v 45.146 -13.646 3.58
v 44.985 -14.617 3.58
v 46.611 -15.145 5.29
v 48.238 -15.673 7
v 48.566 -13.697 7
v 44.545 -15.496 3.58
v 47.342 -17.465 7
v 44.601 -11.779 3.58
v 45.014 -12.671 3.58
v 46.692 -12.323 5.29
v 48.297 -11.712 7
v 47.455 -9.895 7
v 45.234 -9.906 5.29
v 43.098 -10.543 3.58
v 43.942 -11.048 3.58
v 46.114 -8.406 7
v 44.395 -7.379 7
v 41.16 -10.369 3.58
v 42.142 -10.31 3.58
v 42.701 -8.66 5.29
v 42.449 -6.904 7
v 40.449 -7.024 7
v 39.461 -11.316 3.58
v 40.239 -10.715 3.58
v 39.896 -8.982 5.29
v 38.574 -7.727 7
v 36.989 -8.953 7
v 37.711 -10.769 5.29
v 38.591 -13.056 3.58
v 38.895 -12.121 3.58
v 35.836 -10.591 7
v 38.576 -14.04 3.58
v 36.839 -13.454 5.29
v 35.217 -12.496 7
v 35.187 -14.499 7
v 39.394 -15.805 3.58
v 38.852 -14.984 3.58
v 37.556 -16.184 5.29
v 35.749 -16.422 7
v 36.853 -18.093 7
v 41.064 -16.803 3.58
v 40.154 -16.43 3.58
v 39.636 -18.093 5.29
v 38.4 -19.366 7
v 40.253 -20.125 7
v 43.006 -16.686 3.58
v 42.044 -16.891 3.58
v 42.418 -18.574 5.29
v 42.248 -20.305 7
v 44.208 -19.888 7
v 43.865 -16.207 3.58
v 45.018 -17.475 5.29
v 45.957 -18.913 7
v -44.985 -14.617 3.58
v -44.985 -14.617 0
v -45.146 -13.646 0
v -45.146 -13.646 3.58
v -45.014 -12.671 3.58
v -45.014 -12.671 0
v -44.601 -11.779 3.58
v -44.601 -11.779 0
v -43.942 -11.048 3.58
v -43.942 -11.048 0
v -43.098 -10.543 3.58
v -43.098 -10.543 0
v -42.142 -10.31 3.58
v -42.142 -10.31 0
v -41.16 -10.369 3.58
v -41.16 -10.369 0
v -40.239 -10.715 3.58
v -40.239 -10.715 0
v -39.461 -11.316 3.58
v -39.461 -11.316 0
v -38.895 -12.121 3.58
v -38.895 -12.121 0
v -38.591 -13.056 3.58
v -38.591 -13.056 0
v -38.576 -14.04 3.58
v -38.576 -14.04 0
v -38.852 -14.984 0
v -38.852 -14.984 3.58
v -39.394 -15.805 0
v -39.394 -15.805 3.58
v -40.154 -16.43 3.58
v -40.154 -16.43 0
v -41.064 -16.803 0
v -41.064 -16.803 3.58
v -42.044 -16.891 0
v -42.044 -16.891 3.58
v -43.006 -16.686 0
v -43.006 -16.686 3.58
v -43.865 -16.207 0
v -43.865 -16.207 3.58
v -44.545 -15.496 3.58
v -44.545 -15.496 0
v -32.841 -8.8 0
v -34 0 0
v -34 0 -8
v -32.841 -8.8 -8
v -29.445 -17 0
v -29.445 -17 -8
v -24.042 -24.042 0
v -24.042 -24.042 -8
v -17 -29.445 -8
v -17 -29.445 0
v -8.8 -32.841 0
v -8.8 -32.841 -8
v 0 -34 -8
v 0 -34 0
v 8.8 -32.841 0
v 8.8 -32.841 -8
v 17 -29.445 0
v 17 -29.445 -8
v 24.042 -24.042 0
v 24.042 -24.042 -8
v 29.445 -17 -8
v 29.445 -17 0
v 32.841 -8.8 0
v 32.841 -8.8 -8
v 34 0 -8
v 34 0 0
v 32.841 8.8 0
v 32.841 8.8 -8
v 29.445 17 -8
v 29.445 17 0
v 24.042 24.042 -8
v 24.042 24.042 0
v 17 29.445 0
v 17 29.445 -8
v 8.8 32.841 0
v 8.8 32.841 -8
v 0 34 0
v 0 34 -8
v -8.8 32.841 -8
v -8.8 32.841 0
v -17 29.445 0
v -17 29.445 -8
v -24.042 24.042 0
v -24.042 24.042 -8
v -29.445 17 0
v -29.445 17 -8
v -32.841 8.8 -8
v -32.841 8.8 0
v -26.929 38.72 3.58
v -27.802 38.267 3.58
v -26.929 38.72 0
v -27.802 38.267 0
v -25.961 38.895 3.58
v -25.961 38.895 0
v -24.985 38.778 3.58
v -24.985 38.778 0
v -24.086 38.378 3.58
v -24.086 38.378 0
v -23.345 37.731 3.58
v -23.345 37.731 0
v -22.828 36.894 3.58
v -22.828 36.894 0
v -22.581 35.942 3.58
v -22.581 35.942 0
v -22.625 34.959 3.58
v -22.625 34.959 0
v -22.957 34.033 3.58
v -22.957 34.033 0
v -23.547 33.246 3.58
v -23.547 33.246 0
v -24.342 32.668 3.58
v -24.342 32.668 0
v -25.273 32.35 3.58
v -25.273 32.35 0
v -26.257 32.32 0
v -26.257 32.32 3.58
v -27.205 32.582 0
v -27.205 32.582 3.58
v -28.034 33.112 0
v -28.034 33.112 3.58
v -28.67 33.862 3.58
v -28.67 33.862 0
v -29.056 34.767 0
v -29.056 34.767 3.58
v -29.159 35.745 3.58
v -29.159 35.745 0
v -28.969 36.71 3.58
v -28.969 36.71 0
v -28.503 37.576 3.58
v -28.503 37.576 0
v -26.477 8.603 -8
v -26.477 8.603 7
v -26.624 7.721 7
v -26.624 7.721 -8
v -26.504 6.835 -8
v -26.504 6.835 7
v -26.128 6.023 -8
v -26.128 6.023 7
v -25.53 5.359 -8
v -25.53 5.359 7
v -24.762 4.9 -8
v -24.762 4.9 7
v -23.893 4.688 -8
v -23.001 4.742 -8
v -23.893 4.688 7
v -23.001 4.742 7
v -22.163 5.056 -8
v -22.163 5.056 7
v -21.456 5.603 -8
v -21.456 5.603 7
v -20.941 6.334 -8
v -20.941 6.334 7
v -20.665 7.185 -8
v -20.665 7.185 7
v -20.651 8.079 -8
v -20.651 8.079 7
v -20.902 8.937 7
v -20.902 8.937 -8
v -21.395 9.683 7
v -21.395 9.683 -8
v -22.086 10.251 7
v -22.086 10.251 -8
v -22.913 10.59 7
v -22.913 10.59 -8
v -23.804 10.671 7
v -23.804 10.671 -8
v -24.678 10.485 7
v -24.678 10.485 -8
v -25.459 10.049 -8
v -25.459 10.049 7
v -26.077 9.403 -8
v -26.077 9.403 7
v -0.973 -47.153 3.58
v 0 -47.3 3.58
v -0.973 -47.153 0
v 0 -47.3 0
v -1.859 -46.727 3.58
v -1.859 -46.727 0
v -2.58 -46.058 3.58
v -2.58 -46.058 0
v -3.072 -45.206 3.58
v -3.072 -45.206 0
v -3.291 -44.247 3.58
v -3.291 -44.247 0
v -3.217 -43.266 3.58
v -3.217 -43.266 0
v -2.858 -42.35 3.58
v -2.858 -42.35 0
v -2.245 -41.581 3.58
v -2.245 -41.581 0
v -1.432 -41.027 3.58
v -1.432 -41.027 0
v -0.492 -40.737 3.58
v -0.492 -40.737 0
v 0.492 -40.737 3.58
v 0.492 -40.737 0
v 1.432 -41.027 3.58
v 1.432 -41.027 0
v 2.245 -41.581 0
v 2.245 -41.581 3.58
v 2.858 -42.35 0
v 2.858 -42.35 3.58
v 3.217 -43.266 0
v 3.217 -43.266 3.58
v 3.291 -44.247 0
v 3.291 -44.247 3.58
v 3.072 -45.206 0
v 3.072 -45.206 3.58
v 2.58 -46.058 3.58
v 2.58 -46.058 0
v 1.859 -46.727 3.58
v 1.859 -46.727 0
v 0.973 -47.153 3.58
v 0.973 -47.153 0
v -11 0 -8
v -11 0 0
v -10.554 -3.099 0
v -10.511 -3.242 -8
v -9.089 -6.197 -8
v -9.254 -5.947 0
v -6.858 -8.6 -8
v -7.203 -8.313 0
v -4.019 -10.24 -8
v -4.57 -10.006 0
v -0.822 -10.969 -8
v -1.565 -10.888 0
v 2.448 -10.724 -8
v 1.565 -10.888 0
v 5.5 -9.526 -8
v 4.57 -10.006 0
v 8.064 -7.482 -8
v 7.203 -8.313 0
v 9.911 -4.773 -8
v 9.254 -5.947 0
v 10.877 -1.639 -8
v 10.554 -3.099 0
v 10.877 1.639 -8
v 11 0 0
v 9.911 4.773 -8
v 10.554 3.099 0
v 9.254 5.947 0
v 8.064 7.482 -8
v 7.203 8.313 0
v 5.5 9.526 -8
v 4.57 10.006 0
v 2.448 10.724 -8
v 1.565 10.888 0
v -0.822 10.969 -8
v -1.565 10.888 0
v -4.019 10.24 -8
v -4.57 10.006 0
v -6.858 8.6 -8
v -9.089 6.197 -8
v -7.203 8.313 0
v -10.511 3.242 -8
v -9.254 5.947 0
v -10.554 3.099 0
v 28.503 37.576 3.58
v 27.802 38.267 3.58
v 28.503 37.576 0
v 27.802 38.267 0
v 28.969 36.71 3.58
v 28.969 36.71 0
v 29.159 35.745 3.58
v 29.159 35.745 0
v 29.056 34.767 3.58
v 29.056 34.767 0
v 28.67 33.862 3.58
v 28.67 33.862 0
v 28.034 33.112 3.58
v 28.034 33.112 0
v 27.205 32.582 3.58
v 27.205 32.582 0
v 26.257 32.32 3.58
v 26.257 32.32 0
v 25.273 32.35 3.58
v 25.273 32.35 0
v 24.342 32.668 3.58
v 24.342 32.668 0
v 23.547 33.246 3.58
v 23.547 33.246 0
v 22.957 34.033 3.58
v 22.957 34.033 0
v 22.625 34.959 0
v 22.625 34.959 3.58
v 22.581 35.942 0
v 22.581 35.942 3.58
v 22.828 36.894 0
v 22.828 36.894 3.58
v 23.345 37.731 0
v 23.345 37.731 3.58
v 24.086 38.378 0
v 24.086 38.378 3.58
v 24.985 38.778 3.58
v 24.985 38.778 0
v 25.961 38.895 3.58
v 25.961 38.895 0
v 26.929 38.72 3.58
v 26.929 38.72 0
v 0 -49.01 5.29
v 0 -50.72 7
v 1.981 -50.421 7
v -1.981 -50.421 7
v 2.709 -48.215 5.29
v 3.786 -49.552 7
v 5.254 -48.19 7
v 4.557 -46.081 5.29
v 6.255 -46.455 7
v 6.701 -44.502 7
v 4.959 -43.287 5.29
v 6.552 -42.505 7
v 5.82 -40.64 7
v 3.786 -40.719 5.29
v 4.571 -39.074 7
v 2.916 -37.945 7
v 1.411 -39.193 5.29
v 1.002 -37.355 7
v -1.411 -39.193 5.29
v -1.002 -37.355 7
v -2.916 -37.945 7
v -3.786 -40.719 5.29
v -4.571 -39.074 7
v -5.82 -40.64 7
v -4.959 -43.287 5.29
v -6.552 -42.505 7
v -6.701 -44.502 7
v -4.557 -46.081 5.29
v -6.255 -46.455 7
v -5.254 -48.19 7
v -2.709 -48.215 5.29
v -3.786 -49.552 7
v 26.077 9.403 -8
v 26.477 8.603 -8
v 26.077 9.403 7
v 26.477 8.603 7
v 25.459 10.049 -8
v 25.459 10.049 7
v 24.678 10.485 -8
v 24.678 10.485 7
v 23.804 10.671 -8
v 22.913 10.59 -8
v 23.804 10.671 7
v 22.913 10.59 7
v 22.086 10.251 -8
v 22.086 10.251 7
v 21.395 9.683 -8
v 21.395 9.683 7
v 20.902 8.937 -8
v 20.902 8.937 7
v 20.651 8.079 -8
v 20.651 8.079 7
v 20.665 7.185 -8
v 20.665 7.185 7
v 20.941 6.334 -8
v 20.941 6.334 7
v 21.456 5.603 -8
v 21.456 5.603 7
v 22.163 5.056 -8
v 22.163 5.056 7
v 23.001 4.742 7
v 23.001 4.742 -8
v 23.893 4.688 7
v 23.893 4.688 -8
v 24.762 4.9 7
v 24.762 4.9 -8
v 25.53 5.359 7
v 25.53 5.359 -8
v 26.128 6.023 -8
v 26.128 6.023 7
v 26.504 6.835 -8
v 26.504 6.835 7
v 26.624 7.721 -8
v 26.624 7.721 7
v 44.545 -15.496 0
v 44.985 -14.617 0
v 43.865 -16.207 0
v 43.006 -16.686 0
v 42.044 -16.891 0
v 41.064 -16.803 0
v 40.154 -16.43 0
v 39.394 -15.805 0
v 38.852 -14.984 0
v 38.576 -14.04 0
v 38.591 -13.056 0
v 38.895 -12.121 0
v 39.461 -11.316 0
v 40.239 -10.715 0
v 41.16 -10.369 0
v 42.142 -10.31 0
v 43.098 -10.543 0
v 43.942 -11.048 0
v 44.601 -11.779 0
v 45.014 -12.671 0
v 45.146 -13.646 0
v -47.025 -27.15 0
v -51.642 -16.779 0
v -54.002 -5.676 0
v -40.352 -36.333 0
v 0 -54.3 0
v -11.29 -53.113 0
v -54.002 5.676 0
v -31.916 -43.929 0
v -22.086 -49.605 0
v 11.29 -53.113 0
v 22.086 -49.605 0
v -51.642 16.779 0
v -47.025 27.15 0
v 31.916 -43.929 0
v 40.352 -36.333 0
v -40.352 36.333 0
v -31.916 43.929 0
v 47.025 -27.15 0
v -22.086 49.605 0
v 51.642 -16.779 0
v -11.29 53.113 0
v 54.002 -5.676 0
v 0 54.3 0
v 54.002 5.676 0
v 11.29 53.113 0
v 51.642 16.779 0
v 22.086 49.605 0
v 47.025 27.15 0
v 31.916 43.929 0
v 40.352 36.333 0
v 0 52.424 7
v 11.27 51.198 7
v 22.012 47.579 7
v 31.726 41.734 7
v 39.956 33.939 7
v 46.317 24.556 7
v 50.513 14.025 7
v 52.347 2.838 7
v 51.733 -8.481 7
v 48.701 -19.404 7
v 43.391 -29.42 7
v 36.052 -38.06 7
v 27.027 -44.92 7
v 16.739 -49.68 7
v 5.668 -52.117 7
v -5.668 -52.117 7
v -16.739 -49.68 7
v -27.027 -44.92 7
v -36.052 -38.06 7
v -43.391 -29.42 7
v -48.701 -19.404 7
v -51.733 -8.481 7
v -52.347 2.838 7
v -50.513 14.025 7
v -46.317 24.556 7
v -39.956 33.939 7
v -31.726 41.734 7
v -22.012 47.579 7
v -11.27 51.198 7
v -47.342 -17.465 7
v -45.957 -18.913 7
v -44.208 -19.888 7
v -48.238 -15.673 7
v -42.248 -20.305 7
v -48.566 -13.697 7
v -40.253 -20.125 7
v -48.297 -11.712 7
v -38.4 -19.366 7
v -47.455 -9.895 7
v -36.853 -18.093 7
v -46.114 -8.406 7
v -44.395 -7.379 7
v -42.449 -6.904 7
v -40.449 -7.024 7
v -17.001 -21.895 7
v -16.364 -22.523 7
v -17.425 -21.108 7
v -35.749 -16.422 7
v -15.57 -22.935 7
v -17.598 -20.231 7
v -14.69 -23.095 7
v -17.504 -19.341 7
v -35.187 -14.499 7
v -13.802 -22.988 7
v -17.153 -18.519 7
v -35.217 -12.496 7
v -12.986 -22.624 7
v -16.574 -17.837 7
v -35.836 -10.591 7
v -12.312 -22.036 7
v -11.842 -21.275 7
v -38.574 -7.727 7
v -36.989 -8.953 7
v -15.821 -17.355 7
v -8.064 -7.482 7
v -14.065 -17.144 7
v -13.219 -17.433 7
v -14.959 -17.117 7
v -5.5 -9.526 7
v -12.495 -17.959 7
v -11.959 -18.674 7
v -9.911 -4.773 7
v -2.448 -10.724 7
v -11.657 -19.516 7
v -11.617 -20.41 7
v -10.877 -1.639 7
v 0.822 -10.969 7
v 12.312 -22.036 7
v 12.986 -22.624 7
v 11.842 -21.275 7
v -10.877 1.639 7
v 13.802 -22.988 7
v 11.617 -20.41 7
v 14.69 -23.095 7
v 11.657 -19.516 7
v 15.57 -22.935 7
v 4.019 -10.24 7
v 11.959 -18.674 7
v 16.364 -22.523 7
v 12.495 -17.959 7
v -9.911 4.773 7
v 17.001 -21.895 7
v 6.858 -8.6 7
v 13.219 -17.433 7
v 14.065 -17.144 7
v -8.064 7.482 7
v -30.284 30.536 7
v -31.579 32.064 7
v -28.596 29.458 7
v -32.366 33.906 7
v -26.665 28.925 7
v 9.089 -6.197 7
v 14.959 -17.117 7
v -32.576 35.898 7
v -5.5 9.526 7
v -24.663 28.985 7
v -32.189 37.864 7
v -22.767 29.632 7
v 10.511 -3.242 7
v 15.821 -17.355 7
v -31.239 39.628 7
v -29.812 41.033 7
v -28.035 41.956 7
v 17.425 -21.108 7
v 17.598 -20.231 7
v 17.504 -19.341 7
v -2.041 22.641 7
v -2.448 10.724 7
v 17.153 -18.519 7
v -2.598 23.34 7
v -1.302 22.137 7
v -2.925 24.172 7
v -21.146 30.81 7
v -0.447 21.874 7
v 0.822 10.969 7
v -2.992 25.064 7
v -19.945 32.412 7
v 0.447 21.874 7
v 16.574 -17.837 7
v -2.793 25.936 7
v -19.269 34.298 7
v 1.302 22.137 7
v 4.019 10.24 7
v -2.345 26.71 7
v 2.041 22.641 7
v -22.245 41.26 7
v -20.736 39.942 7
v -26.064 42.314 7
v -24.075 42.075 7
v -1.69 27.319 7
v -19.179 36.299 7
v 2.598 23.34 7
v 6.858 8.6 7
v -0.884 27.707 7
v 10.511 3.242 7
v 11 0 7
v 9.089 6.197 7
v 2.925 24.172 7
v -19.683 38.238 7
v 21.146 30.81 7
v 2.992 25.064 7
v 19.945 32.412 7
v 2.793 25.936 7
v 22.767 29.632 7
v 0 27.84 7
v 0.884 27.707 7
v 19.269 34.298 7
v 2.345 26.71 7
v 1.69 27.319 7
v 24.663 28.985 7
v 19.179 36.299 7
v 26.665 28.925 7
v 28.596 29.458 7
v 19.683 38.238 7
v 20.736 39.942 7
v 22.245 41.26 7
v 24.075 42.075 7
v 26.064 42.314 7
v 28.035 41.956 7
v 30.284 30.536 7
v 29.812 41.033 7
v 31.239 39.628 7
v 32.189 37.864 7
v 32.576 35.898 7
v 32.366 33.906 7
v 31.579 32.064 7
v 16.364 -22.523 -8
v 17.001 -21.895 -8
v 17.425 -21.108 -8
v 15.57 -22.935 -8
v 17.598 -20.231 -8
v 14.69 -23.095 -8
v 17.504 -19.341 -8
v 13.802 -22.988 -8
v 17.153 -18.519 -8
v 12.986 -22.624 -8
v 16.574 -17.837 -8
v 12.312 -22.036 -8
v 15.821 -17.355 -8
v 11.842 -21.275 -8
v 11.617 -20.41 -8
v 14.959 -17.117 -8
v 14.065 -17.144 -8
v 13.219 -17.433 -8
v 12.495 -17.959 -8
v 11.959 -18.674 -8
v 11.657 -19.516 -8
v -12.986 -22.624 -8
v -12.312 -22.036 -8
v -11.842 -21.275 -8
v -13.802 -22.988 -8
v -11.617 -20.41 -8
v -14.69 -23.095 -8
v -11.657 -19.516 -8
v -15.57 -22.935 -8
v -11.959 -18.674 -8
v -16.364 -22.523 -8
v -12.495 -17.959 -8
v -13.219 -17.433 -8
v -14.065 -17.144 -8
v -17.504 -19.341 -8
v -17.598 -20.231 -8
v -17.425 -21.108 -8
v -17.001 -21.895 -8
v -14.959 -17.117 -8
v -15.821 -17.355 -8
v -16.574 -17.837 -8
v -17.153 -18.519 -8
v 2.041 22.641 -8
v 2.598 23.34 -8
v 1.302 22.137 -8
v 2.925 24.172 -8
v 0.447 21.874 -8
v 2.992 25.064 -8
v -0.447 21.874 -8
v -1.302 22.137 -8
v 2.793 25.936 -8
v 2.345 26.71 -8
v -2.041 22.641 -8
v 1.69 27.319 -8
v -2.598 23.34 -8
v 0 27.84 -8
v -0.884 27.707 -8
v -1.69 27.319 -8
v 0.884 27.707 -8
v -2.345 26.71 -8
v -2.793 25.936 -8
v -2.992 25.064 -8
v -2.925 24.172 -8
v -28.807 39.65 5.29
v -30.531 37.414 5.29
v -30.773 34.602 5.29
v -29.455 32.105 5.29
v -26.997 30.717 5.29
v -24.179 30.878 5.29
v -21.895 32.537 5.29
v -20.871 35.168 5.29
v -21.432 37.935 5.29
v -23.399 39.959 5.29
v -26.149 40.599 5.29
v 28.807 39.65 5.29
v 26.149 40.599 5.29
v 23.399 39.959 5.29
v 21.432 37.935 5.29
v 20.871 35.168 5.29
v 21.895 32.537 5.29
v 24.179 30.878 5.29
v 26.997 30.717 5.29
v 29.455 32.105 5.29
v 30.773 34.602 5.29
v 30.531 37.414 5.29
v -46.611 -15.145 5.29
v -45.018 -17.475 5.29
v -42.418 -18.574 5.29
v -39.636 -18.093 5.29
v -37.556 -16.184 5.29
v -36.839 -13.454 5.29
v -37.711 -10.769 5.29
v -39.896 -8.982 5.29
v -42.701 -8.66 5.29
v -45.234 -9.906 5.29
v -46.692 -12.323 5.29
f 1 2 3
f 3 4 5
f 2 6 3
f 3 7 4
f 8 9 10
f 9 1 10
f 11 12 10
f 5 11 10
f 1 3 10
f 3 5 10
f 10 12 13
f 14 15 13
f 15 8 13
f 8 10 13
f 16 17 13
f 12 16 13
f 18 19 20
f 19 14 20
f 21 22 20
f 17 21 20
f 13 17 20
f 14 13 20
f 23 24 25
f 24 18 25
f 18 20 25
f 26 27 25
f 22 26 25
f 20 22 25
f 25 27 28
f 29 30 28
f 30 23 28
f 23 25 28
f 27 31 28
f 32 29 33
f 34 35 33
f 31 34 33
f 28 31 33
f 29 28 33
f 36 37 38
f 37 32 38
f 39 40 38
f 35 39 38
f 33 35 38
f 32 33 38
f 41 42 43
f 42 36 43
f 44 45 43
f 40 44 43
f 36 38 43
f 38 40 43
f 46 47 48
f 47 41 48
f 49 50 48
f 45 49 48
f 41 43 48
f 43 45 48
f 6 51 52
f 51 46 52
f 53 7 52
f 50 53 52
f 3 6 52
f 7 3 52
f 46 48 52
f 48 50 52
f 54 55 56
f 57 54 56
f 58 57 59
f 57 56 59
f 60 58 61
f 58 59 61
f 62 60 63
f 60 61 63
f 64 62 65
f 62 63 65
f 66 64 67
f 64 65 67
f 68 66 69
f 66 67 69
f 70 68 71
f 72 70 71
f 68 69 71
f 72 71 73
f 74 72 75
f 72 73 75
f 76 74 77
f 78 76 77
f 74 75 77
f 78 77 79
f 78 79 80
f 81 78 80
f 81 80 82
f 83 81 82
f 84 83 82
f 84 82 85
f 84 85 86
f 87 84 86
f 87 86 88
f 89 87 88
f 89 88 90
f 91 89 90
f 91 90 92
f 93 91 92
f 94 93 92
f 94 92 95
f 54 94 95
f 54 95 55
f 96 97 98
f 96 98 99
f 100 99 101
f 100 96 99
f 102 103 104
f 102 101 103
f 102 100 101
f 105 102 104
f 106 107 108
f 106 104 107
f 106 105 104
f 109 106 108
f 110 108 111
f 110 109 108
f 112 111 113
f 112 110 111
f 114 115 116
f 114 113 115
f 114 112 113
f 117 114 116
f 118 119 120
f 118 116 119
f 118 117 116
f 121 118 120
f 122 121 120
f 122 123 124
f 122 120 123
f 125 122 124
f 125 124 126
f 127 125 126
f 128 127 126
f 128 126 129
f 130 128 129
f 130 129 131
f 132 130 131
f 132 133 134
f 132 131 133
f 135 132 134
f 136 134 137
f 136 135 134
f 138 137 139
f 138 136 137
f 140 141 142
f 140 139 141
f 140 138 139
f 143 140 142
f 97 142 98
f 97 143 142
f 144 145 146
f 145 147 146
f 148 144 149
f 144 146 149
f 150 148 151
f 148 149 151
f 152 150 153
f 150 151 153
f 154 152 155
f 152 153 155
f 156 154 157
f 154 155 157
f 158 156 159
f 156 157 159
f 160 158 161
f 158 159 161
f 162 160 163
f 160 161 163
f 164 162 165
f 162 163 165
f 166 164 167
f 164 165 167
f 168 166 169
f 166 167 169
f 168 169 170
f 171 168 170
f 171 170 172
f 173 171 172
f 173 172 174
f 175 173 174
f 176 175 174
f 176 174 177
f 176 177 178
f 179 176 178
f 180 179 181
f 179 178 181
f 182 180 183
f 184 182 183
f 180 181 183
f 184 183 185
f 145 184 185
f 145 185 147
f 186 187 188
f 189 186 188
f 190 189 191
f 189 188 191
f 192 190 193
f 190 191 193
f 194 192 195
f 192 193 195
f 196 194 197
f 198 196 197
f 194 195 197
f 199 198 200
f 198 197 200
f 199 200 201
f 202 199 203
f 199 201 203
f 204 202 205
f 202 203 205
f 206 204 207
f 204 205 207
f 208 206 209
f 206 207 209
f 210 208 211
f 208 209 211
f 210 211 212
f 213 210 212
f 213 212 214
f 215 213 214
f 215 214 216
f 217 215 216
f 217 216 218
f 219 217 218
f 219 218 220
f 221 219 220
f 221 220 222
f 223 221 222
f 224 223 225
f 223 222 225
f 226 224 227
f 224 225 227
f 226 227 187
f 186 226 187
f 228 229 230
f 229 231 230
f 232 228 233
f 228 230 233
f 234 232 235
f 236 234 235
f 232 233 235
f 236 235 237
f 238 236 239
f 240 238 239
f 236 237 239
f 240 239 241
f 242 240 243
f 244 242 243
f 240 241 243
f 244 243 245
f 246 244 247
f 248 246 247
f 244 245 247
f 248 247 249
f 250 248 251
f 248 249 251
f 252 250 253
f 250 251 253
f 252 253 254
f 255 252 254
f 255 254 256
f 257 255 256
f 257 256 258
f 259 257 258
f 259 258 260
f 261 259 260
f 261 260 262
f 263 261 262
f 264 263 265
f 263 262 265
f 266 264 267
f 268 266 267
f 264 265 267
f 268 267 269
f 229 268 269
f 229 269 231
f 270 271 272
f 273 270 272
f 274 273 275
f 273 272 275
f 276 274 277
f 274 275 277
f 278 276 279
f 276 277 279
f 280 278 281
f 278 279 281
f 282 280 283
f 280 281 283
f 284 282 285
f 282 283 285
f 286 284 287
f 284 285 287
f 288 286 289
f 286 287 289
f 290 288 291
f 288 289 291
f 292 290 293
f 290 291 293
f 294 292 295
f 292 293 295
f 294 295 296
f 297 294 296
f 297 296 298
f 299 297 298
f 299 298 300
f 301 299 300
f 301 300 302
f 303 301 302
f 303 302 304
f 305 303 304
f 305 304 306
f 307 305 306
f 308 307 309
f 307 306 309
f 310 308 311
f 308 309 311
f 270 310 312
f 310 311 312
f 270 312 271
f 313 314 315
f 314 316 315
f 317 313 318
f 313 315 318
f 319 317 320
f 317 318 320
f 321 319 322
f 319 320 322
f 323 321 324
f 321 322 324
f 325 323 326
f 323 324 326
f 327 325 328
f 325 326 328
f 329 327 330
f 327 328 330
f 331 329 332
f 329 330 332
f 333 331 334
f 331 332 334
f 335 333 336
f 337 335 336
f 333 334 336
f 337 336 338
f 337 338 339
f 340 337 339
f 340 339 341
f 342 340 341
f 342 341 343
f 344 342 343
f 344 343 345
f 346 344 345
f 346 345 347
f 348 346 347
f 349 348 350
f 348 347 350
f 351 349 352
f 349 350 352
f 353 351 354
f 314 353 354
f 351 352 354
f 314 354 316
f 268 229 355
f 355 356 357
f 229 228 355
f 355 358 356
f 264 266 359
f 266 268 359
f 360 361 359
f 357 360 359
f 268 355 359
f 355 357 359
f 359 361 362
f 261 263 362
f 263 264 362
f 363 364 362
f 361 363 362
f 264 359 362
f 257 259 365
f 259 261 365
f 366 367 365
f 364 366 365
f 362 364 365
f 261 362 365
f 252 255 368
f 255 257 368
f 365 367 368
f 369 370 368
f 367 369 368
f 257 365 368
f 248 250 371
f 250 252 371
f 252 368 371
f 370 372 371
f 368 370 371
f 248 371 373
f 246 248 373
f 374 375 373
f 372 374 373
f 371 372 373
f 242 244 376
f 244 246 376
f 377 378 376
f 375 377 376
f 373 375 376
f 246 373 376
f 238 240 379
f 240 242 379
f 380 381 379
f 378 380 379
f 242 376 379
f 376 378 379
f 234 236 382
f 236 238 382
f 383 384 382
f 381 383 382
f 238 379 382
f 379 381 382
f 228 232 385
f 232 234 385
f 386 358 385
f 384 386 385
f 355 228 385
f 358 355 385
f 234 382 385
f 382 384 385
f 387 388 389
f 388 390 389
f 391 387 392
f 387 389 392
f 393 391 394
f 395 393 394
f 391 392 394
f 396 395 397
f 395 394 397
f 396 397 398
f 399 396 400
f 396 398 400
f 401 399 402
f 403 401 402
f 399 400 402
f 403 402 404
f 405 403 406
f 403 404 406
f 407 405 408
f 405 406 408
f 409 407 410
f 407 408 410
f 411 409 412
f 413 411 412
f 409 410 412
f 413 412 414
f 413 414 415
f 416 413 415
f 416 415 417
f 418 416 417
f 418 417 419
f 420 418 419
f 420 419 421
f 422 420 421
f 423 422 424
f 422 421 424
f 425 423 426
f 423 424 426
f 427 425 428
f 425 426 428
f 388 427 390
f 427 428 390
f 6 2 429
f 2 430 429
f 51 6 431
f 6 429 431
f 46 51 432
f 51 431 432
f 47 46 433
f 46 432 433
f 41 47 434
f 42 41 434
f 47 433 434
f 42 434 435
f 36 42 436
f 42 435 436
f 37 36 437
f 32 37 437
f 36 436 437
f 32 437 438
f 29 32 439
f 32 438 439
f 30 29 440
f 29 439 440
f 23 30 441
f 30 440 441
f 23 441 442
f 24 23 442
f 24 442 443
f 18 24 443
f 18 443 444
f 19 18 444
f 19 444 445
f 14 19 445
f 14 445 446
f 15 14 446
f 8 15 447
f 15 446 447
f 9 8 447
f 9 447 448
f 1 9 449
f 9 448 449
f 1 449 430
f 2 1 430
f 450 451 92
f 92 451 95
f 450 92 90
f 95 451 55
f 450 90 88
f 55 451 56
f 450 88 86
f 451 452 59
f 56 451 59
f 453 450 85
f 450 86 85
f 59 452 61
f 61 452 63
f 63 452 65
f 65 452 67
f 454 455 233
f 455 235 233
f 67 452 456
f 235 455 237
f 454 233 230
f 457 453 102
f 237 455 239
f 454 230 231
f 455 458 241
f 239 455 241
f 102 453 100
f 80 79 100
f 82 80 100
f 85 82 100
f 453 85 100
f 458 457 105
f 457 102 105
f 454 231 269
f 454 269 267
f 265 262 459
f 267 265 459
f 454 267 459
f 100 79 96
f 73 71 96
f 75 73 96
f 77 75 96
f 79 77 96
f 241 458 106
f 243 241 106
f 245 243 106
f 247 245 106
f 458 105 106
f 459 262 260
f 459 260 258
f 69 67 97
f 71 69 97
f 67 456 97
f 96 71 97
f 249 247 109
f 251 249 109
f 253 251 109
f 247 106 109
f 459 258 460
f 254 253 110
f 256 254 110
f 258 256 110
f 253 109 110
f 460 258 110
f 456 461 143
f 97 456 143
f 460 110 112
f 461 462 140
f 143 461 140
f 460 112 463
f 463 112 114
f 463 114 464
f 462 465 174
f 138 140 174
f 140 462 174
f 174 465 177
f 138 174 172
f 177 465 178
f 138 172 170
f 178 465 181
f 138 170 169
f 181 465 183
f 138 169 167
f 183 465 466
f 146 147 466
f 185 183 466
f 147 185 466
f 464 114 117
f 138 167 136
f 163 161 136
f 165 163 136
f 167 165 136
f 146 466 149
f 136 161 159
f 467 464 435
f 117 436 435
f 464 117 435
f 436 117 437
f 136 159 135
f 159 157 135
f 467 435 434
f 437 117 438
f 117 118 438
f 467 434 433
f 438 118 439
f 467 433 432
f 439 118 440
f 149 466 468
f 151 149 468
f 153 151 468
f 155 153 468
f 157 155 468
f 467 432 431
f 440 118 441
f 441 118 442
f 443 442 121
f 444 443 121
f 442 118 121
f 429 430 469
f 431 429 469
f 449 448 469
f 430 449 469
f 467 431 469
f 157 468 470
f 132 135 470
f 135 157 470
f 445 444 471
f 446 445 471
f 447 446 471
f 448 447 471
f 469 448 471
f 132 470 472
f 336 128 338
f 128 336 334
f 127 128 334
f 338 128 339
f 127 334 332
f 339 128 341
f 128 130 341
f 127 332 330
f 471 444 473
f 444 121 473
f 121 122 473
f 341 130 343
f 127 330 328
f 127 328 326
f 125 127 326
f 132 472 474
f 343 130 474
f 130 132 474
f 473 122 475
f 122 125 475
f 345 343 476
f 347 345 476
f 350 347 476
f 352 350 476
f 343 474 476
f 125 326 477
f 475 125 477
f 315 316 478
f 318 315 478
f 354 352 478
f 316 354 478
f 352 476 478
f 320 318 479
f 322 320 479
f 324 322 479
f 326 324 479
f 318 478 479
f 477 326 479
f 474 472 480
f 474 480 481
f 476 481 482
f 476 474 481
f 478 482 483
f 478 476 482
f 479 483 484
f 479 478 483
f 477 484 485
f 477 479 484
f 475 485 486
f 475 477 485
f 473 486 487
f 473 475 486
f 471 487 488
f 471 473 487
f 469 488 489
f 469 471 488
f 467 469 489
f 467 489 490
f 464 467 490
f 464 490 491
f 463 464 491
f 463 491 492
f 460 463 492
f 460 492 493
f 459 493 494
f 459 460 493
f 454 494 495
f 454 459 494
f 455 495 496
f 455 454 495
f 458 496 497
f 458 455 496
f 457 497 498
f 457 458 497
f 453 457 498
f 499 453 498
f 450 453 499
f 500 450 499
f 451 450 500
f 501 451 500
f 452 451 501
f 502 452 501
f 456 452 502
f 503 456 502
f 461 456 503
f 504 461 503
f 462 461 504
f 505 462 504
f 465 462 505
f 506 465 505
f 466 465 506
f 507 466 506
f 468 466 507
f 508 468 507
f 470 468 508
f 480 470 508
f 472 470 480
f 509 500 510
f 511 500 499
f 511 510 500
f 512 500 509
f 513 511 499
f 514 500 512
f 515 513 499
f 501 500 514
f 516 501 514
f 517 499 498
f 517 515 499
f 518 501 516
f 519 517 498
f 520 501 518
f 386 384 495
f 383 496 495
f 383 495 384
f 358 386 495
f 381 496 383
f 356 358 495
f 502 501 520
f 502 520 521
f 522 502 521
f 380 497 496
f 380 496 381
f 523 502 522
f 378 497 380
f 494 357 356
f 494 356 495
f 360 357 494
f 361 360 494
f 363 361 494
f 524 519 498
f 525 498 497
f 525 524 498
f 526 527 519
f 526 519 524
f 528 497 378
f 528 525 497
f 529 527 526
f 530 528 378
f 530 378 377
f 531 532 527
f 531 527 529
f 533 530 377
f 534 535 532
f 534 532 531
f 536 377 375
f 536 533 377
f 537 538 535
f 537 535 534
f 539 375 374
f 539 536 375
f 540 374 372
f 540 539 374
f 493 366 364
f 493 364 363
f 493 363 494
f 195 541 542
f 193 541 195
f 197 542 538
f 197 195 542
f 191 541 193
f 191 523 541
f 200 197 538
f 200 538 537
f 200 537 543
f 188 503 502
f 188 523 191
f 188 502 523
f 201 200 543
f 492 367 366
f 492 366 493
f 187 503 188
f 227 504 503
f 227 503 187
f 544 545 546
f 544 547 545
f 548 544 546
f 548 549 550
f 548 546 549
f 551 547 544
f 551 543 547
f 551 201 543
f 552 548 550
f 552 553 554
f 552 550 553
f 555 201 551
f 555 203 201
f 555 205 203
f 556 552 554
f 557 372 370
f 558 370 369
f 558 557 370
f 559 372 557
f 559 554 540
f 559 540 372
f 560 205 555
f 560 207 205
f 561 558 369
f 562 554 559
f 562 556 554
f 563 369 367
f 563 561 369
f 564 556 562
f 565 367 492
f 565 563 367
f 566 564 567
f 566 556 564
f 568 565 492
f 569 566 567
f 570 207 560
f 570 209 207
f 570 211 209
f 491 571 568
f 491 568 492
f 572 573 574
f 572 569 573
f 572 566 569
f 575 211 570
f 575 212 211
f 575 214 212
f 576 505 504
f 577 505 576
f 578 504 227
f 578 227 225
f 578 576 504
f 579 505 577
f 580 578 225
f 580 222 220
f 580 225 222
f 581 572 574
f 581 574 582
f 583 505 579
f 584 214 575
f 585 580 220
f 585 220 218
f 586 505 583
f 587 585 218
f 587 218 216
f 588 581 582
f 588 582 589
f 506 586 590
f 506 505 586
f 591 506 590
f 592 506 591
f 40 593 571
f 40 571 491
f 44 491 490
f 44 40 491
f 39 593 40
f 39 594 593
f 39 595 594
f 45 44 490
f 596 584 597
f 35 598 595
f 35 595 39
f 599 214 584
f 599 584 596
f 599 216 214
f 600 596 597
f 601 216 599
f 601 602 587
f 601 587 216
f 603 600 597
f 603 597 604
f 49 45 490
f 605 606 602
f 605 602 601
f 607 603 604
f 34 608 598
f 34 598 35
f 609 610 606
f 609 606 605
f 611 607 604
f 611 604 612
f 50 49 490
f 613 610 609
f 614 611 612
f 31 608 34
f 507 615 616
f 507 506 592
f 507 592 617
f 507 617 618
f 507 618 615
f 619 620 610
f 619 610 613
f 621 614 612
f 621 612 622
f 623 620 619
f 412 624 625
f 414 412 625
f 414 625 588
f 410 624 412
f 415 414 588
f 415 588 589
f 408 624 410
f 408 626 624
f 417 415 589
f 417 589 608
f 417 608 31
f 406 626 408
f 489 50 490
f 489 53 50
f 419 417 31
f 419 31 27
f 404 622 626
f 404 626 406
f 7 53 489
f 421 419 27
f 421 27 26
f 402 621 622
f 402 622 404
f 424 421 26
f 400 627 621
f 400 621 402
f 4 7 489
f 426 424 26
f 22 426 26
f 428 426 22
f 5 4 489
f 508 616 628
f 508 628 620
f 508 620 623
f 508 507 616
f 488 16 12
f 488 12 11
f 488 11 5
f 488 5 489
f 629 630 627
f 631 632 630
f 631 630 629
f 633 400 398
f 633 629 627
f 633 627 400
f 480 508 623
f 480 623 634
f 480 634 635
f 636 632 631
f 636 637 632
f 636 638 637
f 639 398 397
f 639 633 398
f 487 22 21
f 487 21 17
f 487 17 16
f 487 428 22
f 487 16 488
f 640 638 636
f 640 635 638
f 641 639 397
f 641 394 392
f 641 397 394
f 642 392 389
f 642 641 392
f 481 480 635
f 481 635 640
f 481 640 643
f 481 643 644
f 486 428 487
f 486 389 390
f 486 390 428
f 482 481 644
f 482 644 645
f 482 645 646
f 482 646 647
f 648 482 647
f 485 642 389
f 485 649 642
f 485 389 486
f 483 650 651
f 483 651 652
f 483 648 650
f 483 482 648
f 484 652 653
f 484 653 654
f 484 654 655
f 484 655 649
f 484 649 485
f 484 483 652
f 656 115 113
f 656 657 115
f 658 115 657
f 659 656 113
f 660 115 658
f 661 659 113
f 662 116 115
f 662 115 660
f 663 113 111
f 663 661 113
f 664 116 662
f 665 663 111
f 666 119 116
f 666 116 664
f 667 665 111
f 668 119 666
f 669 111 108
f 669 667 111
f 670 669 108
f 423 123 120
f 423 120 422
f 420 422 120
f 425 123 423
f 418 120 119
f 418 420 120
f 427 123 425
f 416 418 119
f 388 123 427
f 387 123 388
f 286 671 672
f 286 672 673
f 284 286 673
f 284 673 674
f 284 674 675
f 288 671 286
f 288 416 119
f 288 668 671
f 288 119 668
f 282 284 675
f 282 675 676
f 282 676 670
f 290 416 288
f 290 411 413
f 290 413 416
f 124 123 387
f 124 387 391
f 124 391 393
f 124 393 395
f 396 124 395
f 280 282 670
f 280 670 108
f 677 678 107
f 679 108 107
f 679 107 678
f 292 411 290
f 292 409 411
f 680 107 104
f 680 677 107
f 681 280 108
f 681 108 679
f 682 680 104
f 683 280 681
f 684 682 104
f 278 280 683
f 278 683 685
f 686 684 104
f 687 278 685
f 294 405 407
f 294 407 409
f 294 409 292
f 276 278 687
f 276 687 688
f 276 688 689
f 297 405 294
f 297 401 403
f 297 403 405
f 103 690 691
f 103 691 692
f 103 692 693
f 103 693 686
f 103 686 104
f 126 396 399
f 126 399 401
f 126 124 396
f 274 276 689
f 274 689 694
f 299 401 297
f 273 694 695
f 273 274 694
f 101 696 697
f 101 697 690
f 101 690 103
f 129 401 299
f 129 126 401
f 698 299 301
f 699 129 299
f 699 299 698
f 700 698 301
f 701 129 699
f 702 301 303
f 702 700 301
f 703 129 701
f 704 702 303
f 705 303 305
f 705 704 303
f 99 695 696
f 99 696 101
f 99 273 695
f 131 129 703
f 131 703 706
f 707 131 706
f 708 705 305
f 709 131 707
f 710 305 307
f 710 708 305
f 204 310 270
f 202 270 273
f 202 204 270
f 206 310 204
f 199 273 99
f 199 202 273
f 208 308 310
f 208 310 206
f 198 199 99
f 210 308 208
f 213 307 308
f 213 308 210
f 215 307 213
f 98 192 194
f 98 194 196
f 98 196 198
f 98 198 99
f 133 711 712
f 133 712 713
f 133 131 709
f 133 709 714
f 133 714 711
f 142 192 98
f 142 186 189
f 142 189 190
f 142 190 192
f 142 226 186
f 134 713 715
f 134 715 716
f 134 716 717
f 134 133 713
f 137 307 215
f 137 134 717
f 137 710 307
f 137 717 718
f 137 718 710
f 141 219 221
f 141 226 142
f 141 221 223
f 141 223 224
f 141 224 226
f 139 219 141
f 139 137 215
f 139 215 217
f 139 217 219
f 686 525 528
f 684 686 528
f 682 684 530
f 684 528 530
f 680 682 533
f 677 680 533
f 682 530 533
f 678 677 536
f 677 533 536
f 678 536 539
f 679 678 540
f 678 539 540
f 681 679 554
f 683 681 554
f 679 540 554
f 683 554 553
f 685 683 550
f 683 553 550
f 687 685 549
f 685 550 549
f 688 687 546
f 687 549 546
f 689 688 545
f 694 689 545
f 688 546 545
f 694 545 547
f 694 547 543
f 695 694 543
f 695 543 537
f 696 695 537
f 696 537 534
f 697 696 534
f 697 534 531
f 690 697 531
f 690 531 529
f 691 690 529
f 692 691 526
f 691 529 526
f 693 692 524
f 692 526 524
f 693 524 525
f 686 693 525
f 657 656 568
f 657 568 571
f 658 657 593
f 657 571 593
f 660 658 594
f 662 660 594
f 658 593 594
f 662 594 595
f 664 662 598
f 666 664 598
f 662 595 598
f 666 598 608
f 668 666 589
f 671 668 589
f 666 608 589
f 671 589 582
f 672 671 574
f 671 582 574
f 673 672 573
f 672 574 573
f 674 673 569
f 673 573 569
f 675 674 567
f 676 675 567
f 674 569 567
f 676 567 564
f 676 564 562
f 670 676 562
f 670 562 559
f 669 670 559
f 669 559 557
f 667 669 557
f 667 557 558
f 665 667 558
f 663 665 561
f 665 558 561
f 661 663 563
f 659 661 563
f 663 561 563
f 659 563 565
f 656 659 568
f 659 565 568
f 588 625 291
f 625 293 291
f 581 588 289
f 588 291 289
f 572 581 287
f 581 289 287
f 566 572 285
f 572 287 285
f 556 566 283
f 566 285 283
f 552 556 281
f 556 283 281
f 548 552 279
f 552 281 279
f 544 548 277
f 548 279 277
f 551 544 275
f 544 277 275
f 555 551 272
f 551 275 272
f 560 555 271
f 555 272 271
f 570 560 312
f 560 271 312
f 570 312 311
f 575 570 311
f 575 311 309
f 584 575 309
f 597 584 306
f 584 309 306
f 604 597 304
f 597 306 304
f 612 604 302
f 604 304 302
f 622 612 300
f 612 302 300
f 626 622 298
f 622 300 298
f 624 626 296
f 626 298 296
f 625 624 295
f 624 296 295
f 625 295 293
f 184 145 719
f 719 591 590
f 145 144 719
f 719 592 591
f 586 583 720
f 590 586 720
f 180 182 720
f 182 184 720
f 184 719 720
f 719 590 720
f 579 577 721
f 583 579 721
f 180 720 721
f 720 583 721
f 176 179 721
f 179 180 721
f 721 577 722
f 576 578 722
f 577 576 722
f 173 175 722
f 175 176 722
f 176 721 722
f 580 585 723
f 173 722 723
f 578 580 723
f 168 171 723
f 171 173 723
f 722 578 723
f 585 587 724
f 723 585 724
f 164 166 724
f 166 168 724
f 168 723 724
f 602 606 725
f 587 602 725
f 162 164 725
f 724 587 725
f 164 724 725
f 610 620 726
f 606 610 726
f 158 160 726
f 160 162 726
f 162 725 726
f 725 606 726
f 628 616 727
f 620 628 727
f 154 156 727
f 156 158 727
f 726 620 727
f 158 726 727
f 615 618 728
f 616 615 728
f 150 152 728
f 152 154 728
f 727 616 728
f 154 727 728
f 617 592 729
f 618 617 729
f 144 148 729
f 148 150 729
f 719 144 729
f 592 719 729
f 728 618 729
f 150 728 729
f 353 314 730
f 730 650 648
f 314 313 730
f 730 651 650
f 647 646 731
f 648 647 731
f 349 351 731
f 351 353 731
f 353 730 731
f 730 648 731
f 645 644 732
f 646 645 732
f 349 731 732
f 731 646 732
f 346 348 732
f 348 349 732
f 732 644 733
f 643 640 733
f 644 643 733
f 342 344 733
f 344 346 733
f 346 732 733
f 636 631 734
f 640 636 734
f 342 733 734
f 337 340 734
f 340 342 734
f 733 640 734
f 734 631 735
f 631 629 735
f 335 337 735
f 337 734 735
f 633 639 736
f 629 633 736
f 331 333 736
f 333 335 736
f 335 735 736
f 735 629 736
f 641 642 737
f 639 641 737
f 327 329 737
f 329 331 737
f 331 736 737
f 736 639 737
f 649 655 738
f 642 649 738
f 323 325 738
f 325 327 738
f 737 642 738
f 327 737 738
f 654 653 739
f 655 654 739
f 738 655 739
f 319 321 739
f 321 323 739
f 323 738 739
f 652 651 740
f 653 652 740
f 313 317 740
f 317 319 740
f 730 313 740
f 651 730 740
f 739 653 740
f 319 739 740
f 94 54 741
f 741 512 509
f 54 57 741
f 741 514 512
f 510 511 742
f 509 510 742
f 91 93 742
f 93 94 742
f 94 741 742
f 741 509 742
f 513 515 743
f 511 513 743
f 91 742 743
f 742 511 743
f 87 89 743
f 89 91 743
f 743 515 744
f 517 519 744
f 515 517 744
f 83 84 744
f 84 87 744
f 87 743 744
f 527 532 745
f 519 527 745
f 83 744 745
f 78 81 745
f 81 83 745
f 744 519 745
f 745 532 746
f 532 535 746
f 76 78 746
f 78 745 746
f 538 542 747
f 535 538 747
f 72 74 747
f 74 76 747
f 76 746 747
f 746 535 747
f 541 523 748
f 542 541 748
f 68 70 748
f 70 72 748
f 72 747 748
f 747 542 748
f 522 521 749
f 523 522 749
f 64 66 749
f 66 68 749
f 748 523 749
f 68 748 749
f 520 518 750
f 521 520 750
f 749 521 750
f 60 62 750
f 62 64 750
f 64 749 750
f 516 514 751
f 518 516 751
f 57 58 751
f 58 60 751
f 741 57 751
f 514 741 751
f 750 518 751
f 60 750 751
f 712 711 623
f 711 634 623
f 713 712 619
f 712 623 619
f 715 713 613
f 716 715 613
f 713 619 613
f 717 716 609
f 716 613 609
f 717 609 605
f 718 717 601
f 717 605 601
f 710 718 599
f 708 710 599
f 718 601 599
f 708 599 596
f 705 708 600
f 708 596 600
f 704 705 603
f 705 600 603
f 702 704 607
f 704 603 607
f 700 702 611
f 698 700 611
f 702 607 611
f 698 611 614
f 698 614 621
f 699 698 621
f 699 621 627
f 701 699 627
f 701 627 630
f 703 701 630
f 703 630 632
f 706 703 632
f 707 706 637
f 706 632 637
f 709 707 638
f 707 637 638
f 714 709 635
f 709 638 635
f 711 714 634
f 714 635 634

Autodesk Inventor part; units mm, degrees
ref_plane "YZ Plane" through (0, 0, 0) normal (1, 0, 0) x (0, 1, 0)
ref_plane "XZ Plane" through (0, 0, 0) normal (0, 1, 0) x (-1, 0, 0)
ref_plane "XY Plane" through (0, 0, 0) normal (0, 0, 1) x (1, 0, 0)
sketch "Sketch1" plane through (0, 0, 0) normal (0, 0, 1) x (1, 0, 0)
  circle A0 centre (0, 0) radius 11
  circle A1 centre (0, 0) radius 54.2995
  dimension "d0" = 22
  dimension "d1" = 108.599
extrude "Extrusion1" add sketch "Sketch1" along normal blind 7
sketch "Sketch2" plane through (0, 0, 0) normal (0, 0, -1) x (-1, 0, 0)
  circle A0 centre (0, 0) radius 11 projected
  circle A1 centre (0, 0) radius 54.2995 projected
  circle A2 centre (0, 0) radius 34
  dimension "d4" = 68
extrude "Extrusion2" add sketch "Sketch2" along normal blind 8 contours A2
sketch "Sketch3" plane through (0, 0, -8) normal (0, 0, -1) x (-1, 0, 0)
  circle A0 centre (0, 0) radius 11 projected
  point P0 (0, 24.84)
  dimension "d7" = 24.84
hole "Hole1" at (0, 24.84, -8) direction (0, 0, 1) diameter 6 end through all
sketch "Sketch4" plane through (0, 0, 7) normal (0, 0, 1) x (1, 0, 0)
  circle A0 centre (0, 0) radius 11 projected
  point P0 (0, -44)
  dimension "d15" = 44
hole "Hole2" at (0, -44, 7) direction (0, 0, -1) diameter 6.6 end through all countersink diameter 13.44 countersink angle 90
pattern_circular "Circular Pattern1" count 5 over 360 about axis through (0, 0, -10) along (0, 0, 1) of "Hole2", "Hole1"
sketch "Sketch5" plane through (0, 0, 0) normal (1, 0, 0) x (0, 1, 0)
  line L0 (21.84, 7) -> (21.84, -8) projected
  line L1 (21.84, -8) -> (11, -8) projected
  line L2 (11, -8) -> (11, 7) projected
  line L3 (11, 7) -> (21.84, 7) projected
  line L4 (-34, -8) -> (-34, 0) projected
  line L5 (-34, 0) -> (-40.7, 0) projected
  line L6 (-40.7, 0) -> (-40.7, 3.58) projected
  line L7 (-40.7, 3.58) -> (-37.28, 7) projected
  line L8 (-37.28, 7) -> (-11, 7) projected
  line L9 (-11, 7) -> (-11, -8) projected
  line L10 (-11, -8) -> (-34, -8) projected
  line L11 (-54.2995, 0) -> (-54.2995, 7) projected
  line L12 (-54.2995, 7) -> (-50.72, 7) projected
  line L13 (-50.72, 7) -> (-47.3, 3.58) projected
  line L14 (-47.3, 3.58) -> (-47.3, 0) projected
  line L15 (-47.3, 0) -> (-54.2995, 0) projected
  line L16 (54.2995, 7) -> (54.2995, 0) projected
  line L17 (54.2995, 0) -> (34, 0) projected
  line L18 (34, 0) -> (34, -8) projected
  line L19 (34, -8) -> (27.84, -8) projected
  line L20 (27.84, -8) -> (27.84, 7) projected
  line L21 (27.84, 7) -> (54.2995, 7) projected
  line L22 (54.2995, 0) -> (52.4239, 7)
  line L23 (0, -11) -> (0, 10) projected
  dimension "d26" = 15
revolve "Revolution1" cut sketch "Sketch5" angle 360 about axis through (0, 0, -10) along (0, 0, 1) contours L16 L22 L21
properties part number "332-01" material "Titanium"
